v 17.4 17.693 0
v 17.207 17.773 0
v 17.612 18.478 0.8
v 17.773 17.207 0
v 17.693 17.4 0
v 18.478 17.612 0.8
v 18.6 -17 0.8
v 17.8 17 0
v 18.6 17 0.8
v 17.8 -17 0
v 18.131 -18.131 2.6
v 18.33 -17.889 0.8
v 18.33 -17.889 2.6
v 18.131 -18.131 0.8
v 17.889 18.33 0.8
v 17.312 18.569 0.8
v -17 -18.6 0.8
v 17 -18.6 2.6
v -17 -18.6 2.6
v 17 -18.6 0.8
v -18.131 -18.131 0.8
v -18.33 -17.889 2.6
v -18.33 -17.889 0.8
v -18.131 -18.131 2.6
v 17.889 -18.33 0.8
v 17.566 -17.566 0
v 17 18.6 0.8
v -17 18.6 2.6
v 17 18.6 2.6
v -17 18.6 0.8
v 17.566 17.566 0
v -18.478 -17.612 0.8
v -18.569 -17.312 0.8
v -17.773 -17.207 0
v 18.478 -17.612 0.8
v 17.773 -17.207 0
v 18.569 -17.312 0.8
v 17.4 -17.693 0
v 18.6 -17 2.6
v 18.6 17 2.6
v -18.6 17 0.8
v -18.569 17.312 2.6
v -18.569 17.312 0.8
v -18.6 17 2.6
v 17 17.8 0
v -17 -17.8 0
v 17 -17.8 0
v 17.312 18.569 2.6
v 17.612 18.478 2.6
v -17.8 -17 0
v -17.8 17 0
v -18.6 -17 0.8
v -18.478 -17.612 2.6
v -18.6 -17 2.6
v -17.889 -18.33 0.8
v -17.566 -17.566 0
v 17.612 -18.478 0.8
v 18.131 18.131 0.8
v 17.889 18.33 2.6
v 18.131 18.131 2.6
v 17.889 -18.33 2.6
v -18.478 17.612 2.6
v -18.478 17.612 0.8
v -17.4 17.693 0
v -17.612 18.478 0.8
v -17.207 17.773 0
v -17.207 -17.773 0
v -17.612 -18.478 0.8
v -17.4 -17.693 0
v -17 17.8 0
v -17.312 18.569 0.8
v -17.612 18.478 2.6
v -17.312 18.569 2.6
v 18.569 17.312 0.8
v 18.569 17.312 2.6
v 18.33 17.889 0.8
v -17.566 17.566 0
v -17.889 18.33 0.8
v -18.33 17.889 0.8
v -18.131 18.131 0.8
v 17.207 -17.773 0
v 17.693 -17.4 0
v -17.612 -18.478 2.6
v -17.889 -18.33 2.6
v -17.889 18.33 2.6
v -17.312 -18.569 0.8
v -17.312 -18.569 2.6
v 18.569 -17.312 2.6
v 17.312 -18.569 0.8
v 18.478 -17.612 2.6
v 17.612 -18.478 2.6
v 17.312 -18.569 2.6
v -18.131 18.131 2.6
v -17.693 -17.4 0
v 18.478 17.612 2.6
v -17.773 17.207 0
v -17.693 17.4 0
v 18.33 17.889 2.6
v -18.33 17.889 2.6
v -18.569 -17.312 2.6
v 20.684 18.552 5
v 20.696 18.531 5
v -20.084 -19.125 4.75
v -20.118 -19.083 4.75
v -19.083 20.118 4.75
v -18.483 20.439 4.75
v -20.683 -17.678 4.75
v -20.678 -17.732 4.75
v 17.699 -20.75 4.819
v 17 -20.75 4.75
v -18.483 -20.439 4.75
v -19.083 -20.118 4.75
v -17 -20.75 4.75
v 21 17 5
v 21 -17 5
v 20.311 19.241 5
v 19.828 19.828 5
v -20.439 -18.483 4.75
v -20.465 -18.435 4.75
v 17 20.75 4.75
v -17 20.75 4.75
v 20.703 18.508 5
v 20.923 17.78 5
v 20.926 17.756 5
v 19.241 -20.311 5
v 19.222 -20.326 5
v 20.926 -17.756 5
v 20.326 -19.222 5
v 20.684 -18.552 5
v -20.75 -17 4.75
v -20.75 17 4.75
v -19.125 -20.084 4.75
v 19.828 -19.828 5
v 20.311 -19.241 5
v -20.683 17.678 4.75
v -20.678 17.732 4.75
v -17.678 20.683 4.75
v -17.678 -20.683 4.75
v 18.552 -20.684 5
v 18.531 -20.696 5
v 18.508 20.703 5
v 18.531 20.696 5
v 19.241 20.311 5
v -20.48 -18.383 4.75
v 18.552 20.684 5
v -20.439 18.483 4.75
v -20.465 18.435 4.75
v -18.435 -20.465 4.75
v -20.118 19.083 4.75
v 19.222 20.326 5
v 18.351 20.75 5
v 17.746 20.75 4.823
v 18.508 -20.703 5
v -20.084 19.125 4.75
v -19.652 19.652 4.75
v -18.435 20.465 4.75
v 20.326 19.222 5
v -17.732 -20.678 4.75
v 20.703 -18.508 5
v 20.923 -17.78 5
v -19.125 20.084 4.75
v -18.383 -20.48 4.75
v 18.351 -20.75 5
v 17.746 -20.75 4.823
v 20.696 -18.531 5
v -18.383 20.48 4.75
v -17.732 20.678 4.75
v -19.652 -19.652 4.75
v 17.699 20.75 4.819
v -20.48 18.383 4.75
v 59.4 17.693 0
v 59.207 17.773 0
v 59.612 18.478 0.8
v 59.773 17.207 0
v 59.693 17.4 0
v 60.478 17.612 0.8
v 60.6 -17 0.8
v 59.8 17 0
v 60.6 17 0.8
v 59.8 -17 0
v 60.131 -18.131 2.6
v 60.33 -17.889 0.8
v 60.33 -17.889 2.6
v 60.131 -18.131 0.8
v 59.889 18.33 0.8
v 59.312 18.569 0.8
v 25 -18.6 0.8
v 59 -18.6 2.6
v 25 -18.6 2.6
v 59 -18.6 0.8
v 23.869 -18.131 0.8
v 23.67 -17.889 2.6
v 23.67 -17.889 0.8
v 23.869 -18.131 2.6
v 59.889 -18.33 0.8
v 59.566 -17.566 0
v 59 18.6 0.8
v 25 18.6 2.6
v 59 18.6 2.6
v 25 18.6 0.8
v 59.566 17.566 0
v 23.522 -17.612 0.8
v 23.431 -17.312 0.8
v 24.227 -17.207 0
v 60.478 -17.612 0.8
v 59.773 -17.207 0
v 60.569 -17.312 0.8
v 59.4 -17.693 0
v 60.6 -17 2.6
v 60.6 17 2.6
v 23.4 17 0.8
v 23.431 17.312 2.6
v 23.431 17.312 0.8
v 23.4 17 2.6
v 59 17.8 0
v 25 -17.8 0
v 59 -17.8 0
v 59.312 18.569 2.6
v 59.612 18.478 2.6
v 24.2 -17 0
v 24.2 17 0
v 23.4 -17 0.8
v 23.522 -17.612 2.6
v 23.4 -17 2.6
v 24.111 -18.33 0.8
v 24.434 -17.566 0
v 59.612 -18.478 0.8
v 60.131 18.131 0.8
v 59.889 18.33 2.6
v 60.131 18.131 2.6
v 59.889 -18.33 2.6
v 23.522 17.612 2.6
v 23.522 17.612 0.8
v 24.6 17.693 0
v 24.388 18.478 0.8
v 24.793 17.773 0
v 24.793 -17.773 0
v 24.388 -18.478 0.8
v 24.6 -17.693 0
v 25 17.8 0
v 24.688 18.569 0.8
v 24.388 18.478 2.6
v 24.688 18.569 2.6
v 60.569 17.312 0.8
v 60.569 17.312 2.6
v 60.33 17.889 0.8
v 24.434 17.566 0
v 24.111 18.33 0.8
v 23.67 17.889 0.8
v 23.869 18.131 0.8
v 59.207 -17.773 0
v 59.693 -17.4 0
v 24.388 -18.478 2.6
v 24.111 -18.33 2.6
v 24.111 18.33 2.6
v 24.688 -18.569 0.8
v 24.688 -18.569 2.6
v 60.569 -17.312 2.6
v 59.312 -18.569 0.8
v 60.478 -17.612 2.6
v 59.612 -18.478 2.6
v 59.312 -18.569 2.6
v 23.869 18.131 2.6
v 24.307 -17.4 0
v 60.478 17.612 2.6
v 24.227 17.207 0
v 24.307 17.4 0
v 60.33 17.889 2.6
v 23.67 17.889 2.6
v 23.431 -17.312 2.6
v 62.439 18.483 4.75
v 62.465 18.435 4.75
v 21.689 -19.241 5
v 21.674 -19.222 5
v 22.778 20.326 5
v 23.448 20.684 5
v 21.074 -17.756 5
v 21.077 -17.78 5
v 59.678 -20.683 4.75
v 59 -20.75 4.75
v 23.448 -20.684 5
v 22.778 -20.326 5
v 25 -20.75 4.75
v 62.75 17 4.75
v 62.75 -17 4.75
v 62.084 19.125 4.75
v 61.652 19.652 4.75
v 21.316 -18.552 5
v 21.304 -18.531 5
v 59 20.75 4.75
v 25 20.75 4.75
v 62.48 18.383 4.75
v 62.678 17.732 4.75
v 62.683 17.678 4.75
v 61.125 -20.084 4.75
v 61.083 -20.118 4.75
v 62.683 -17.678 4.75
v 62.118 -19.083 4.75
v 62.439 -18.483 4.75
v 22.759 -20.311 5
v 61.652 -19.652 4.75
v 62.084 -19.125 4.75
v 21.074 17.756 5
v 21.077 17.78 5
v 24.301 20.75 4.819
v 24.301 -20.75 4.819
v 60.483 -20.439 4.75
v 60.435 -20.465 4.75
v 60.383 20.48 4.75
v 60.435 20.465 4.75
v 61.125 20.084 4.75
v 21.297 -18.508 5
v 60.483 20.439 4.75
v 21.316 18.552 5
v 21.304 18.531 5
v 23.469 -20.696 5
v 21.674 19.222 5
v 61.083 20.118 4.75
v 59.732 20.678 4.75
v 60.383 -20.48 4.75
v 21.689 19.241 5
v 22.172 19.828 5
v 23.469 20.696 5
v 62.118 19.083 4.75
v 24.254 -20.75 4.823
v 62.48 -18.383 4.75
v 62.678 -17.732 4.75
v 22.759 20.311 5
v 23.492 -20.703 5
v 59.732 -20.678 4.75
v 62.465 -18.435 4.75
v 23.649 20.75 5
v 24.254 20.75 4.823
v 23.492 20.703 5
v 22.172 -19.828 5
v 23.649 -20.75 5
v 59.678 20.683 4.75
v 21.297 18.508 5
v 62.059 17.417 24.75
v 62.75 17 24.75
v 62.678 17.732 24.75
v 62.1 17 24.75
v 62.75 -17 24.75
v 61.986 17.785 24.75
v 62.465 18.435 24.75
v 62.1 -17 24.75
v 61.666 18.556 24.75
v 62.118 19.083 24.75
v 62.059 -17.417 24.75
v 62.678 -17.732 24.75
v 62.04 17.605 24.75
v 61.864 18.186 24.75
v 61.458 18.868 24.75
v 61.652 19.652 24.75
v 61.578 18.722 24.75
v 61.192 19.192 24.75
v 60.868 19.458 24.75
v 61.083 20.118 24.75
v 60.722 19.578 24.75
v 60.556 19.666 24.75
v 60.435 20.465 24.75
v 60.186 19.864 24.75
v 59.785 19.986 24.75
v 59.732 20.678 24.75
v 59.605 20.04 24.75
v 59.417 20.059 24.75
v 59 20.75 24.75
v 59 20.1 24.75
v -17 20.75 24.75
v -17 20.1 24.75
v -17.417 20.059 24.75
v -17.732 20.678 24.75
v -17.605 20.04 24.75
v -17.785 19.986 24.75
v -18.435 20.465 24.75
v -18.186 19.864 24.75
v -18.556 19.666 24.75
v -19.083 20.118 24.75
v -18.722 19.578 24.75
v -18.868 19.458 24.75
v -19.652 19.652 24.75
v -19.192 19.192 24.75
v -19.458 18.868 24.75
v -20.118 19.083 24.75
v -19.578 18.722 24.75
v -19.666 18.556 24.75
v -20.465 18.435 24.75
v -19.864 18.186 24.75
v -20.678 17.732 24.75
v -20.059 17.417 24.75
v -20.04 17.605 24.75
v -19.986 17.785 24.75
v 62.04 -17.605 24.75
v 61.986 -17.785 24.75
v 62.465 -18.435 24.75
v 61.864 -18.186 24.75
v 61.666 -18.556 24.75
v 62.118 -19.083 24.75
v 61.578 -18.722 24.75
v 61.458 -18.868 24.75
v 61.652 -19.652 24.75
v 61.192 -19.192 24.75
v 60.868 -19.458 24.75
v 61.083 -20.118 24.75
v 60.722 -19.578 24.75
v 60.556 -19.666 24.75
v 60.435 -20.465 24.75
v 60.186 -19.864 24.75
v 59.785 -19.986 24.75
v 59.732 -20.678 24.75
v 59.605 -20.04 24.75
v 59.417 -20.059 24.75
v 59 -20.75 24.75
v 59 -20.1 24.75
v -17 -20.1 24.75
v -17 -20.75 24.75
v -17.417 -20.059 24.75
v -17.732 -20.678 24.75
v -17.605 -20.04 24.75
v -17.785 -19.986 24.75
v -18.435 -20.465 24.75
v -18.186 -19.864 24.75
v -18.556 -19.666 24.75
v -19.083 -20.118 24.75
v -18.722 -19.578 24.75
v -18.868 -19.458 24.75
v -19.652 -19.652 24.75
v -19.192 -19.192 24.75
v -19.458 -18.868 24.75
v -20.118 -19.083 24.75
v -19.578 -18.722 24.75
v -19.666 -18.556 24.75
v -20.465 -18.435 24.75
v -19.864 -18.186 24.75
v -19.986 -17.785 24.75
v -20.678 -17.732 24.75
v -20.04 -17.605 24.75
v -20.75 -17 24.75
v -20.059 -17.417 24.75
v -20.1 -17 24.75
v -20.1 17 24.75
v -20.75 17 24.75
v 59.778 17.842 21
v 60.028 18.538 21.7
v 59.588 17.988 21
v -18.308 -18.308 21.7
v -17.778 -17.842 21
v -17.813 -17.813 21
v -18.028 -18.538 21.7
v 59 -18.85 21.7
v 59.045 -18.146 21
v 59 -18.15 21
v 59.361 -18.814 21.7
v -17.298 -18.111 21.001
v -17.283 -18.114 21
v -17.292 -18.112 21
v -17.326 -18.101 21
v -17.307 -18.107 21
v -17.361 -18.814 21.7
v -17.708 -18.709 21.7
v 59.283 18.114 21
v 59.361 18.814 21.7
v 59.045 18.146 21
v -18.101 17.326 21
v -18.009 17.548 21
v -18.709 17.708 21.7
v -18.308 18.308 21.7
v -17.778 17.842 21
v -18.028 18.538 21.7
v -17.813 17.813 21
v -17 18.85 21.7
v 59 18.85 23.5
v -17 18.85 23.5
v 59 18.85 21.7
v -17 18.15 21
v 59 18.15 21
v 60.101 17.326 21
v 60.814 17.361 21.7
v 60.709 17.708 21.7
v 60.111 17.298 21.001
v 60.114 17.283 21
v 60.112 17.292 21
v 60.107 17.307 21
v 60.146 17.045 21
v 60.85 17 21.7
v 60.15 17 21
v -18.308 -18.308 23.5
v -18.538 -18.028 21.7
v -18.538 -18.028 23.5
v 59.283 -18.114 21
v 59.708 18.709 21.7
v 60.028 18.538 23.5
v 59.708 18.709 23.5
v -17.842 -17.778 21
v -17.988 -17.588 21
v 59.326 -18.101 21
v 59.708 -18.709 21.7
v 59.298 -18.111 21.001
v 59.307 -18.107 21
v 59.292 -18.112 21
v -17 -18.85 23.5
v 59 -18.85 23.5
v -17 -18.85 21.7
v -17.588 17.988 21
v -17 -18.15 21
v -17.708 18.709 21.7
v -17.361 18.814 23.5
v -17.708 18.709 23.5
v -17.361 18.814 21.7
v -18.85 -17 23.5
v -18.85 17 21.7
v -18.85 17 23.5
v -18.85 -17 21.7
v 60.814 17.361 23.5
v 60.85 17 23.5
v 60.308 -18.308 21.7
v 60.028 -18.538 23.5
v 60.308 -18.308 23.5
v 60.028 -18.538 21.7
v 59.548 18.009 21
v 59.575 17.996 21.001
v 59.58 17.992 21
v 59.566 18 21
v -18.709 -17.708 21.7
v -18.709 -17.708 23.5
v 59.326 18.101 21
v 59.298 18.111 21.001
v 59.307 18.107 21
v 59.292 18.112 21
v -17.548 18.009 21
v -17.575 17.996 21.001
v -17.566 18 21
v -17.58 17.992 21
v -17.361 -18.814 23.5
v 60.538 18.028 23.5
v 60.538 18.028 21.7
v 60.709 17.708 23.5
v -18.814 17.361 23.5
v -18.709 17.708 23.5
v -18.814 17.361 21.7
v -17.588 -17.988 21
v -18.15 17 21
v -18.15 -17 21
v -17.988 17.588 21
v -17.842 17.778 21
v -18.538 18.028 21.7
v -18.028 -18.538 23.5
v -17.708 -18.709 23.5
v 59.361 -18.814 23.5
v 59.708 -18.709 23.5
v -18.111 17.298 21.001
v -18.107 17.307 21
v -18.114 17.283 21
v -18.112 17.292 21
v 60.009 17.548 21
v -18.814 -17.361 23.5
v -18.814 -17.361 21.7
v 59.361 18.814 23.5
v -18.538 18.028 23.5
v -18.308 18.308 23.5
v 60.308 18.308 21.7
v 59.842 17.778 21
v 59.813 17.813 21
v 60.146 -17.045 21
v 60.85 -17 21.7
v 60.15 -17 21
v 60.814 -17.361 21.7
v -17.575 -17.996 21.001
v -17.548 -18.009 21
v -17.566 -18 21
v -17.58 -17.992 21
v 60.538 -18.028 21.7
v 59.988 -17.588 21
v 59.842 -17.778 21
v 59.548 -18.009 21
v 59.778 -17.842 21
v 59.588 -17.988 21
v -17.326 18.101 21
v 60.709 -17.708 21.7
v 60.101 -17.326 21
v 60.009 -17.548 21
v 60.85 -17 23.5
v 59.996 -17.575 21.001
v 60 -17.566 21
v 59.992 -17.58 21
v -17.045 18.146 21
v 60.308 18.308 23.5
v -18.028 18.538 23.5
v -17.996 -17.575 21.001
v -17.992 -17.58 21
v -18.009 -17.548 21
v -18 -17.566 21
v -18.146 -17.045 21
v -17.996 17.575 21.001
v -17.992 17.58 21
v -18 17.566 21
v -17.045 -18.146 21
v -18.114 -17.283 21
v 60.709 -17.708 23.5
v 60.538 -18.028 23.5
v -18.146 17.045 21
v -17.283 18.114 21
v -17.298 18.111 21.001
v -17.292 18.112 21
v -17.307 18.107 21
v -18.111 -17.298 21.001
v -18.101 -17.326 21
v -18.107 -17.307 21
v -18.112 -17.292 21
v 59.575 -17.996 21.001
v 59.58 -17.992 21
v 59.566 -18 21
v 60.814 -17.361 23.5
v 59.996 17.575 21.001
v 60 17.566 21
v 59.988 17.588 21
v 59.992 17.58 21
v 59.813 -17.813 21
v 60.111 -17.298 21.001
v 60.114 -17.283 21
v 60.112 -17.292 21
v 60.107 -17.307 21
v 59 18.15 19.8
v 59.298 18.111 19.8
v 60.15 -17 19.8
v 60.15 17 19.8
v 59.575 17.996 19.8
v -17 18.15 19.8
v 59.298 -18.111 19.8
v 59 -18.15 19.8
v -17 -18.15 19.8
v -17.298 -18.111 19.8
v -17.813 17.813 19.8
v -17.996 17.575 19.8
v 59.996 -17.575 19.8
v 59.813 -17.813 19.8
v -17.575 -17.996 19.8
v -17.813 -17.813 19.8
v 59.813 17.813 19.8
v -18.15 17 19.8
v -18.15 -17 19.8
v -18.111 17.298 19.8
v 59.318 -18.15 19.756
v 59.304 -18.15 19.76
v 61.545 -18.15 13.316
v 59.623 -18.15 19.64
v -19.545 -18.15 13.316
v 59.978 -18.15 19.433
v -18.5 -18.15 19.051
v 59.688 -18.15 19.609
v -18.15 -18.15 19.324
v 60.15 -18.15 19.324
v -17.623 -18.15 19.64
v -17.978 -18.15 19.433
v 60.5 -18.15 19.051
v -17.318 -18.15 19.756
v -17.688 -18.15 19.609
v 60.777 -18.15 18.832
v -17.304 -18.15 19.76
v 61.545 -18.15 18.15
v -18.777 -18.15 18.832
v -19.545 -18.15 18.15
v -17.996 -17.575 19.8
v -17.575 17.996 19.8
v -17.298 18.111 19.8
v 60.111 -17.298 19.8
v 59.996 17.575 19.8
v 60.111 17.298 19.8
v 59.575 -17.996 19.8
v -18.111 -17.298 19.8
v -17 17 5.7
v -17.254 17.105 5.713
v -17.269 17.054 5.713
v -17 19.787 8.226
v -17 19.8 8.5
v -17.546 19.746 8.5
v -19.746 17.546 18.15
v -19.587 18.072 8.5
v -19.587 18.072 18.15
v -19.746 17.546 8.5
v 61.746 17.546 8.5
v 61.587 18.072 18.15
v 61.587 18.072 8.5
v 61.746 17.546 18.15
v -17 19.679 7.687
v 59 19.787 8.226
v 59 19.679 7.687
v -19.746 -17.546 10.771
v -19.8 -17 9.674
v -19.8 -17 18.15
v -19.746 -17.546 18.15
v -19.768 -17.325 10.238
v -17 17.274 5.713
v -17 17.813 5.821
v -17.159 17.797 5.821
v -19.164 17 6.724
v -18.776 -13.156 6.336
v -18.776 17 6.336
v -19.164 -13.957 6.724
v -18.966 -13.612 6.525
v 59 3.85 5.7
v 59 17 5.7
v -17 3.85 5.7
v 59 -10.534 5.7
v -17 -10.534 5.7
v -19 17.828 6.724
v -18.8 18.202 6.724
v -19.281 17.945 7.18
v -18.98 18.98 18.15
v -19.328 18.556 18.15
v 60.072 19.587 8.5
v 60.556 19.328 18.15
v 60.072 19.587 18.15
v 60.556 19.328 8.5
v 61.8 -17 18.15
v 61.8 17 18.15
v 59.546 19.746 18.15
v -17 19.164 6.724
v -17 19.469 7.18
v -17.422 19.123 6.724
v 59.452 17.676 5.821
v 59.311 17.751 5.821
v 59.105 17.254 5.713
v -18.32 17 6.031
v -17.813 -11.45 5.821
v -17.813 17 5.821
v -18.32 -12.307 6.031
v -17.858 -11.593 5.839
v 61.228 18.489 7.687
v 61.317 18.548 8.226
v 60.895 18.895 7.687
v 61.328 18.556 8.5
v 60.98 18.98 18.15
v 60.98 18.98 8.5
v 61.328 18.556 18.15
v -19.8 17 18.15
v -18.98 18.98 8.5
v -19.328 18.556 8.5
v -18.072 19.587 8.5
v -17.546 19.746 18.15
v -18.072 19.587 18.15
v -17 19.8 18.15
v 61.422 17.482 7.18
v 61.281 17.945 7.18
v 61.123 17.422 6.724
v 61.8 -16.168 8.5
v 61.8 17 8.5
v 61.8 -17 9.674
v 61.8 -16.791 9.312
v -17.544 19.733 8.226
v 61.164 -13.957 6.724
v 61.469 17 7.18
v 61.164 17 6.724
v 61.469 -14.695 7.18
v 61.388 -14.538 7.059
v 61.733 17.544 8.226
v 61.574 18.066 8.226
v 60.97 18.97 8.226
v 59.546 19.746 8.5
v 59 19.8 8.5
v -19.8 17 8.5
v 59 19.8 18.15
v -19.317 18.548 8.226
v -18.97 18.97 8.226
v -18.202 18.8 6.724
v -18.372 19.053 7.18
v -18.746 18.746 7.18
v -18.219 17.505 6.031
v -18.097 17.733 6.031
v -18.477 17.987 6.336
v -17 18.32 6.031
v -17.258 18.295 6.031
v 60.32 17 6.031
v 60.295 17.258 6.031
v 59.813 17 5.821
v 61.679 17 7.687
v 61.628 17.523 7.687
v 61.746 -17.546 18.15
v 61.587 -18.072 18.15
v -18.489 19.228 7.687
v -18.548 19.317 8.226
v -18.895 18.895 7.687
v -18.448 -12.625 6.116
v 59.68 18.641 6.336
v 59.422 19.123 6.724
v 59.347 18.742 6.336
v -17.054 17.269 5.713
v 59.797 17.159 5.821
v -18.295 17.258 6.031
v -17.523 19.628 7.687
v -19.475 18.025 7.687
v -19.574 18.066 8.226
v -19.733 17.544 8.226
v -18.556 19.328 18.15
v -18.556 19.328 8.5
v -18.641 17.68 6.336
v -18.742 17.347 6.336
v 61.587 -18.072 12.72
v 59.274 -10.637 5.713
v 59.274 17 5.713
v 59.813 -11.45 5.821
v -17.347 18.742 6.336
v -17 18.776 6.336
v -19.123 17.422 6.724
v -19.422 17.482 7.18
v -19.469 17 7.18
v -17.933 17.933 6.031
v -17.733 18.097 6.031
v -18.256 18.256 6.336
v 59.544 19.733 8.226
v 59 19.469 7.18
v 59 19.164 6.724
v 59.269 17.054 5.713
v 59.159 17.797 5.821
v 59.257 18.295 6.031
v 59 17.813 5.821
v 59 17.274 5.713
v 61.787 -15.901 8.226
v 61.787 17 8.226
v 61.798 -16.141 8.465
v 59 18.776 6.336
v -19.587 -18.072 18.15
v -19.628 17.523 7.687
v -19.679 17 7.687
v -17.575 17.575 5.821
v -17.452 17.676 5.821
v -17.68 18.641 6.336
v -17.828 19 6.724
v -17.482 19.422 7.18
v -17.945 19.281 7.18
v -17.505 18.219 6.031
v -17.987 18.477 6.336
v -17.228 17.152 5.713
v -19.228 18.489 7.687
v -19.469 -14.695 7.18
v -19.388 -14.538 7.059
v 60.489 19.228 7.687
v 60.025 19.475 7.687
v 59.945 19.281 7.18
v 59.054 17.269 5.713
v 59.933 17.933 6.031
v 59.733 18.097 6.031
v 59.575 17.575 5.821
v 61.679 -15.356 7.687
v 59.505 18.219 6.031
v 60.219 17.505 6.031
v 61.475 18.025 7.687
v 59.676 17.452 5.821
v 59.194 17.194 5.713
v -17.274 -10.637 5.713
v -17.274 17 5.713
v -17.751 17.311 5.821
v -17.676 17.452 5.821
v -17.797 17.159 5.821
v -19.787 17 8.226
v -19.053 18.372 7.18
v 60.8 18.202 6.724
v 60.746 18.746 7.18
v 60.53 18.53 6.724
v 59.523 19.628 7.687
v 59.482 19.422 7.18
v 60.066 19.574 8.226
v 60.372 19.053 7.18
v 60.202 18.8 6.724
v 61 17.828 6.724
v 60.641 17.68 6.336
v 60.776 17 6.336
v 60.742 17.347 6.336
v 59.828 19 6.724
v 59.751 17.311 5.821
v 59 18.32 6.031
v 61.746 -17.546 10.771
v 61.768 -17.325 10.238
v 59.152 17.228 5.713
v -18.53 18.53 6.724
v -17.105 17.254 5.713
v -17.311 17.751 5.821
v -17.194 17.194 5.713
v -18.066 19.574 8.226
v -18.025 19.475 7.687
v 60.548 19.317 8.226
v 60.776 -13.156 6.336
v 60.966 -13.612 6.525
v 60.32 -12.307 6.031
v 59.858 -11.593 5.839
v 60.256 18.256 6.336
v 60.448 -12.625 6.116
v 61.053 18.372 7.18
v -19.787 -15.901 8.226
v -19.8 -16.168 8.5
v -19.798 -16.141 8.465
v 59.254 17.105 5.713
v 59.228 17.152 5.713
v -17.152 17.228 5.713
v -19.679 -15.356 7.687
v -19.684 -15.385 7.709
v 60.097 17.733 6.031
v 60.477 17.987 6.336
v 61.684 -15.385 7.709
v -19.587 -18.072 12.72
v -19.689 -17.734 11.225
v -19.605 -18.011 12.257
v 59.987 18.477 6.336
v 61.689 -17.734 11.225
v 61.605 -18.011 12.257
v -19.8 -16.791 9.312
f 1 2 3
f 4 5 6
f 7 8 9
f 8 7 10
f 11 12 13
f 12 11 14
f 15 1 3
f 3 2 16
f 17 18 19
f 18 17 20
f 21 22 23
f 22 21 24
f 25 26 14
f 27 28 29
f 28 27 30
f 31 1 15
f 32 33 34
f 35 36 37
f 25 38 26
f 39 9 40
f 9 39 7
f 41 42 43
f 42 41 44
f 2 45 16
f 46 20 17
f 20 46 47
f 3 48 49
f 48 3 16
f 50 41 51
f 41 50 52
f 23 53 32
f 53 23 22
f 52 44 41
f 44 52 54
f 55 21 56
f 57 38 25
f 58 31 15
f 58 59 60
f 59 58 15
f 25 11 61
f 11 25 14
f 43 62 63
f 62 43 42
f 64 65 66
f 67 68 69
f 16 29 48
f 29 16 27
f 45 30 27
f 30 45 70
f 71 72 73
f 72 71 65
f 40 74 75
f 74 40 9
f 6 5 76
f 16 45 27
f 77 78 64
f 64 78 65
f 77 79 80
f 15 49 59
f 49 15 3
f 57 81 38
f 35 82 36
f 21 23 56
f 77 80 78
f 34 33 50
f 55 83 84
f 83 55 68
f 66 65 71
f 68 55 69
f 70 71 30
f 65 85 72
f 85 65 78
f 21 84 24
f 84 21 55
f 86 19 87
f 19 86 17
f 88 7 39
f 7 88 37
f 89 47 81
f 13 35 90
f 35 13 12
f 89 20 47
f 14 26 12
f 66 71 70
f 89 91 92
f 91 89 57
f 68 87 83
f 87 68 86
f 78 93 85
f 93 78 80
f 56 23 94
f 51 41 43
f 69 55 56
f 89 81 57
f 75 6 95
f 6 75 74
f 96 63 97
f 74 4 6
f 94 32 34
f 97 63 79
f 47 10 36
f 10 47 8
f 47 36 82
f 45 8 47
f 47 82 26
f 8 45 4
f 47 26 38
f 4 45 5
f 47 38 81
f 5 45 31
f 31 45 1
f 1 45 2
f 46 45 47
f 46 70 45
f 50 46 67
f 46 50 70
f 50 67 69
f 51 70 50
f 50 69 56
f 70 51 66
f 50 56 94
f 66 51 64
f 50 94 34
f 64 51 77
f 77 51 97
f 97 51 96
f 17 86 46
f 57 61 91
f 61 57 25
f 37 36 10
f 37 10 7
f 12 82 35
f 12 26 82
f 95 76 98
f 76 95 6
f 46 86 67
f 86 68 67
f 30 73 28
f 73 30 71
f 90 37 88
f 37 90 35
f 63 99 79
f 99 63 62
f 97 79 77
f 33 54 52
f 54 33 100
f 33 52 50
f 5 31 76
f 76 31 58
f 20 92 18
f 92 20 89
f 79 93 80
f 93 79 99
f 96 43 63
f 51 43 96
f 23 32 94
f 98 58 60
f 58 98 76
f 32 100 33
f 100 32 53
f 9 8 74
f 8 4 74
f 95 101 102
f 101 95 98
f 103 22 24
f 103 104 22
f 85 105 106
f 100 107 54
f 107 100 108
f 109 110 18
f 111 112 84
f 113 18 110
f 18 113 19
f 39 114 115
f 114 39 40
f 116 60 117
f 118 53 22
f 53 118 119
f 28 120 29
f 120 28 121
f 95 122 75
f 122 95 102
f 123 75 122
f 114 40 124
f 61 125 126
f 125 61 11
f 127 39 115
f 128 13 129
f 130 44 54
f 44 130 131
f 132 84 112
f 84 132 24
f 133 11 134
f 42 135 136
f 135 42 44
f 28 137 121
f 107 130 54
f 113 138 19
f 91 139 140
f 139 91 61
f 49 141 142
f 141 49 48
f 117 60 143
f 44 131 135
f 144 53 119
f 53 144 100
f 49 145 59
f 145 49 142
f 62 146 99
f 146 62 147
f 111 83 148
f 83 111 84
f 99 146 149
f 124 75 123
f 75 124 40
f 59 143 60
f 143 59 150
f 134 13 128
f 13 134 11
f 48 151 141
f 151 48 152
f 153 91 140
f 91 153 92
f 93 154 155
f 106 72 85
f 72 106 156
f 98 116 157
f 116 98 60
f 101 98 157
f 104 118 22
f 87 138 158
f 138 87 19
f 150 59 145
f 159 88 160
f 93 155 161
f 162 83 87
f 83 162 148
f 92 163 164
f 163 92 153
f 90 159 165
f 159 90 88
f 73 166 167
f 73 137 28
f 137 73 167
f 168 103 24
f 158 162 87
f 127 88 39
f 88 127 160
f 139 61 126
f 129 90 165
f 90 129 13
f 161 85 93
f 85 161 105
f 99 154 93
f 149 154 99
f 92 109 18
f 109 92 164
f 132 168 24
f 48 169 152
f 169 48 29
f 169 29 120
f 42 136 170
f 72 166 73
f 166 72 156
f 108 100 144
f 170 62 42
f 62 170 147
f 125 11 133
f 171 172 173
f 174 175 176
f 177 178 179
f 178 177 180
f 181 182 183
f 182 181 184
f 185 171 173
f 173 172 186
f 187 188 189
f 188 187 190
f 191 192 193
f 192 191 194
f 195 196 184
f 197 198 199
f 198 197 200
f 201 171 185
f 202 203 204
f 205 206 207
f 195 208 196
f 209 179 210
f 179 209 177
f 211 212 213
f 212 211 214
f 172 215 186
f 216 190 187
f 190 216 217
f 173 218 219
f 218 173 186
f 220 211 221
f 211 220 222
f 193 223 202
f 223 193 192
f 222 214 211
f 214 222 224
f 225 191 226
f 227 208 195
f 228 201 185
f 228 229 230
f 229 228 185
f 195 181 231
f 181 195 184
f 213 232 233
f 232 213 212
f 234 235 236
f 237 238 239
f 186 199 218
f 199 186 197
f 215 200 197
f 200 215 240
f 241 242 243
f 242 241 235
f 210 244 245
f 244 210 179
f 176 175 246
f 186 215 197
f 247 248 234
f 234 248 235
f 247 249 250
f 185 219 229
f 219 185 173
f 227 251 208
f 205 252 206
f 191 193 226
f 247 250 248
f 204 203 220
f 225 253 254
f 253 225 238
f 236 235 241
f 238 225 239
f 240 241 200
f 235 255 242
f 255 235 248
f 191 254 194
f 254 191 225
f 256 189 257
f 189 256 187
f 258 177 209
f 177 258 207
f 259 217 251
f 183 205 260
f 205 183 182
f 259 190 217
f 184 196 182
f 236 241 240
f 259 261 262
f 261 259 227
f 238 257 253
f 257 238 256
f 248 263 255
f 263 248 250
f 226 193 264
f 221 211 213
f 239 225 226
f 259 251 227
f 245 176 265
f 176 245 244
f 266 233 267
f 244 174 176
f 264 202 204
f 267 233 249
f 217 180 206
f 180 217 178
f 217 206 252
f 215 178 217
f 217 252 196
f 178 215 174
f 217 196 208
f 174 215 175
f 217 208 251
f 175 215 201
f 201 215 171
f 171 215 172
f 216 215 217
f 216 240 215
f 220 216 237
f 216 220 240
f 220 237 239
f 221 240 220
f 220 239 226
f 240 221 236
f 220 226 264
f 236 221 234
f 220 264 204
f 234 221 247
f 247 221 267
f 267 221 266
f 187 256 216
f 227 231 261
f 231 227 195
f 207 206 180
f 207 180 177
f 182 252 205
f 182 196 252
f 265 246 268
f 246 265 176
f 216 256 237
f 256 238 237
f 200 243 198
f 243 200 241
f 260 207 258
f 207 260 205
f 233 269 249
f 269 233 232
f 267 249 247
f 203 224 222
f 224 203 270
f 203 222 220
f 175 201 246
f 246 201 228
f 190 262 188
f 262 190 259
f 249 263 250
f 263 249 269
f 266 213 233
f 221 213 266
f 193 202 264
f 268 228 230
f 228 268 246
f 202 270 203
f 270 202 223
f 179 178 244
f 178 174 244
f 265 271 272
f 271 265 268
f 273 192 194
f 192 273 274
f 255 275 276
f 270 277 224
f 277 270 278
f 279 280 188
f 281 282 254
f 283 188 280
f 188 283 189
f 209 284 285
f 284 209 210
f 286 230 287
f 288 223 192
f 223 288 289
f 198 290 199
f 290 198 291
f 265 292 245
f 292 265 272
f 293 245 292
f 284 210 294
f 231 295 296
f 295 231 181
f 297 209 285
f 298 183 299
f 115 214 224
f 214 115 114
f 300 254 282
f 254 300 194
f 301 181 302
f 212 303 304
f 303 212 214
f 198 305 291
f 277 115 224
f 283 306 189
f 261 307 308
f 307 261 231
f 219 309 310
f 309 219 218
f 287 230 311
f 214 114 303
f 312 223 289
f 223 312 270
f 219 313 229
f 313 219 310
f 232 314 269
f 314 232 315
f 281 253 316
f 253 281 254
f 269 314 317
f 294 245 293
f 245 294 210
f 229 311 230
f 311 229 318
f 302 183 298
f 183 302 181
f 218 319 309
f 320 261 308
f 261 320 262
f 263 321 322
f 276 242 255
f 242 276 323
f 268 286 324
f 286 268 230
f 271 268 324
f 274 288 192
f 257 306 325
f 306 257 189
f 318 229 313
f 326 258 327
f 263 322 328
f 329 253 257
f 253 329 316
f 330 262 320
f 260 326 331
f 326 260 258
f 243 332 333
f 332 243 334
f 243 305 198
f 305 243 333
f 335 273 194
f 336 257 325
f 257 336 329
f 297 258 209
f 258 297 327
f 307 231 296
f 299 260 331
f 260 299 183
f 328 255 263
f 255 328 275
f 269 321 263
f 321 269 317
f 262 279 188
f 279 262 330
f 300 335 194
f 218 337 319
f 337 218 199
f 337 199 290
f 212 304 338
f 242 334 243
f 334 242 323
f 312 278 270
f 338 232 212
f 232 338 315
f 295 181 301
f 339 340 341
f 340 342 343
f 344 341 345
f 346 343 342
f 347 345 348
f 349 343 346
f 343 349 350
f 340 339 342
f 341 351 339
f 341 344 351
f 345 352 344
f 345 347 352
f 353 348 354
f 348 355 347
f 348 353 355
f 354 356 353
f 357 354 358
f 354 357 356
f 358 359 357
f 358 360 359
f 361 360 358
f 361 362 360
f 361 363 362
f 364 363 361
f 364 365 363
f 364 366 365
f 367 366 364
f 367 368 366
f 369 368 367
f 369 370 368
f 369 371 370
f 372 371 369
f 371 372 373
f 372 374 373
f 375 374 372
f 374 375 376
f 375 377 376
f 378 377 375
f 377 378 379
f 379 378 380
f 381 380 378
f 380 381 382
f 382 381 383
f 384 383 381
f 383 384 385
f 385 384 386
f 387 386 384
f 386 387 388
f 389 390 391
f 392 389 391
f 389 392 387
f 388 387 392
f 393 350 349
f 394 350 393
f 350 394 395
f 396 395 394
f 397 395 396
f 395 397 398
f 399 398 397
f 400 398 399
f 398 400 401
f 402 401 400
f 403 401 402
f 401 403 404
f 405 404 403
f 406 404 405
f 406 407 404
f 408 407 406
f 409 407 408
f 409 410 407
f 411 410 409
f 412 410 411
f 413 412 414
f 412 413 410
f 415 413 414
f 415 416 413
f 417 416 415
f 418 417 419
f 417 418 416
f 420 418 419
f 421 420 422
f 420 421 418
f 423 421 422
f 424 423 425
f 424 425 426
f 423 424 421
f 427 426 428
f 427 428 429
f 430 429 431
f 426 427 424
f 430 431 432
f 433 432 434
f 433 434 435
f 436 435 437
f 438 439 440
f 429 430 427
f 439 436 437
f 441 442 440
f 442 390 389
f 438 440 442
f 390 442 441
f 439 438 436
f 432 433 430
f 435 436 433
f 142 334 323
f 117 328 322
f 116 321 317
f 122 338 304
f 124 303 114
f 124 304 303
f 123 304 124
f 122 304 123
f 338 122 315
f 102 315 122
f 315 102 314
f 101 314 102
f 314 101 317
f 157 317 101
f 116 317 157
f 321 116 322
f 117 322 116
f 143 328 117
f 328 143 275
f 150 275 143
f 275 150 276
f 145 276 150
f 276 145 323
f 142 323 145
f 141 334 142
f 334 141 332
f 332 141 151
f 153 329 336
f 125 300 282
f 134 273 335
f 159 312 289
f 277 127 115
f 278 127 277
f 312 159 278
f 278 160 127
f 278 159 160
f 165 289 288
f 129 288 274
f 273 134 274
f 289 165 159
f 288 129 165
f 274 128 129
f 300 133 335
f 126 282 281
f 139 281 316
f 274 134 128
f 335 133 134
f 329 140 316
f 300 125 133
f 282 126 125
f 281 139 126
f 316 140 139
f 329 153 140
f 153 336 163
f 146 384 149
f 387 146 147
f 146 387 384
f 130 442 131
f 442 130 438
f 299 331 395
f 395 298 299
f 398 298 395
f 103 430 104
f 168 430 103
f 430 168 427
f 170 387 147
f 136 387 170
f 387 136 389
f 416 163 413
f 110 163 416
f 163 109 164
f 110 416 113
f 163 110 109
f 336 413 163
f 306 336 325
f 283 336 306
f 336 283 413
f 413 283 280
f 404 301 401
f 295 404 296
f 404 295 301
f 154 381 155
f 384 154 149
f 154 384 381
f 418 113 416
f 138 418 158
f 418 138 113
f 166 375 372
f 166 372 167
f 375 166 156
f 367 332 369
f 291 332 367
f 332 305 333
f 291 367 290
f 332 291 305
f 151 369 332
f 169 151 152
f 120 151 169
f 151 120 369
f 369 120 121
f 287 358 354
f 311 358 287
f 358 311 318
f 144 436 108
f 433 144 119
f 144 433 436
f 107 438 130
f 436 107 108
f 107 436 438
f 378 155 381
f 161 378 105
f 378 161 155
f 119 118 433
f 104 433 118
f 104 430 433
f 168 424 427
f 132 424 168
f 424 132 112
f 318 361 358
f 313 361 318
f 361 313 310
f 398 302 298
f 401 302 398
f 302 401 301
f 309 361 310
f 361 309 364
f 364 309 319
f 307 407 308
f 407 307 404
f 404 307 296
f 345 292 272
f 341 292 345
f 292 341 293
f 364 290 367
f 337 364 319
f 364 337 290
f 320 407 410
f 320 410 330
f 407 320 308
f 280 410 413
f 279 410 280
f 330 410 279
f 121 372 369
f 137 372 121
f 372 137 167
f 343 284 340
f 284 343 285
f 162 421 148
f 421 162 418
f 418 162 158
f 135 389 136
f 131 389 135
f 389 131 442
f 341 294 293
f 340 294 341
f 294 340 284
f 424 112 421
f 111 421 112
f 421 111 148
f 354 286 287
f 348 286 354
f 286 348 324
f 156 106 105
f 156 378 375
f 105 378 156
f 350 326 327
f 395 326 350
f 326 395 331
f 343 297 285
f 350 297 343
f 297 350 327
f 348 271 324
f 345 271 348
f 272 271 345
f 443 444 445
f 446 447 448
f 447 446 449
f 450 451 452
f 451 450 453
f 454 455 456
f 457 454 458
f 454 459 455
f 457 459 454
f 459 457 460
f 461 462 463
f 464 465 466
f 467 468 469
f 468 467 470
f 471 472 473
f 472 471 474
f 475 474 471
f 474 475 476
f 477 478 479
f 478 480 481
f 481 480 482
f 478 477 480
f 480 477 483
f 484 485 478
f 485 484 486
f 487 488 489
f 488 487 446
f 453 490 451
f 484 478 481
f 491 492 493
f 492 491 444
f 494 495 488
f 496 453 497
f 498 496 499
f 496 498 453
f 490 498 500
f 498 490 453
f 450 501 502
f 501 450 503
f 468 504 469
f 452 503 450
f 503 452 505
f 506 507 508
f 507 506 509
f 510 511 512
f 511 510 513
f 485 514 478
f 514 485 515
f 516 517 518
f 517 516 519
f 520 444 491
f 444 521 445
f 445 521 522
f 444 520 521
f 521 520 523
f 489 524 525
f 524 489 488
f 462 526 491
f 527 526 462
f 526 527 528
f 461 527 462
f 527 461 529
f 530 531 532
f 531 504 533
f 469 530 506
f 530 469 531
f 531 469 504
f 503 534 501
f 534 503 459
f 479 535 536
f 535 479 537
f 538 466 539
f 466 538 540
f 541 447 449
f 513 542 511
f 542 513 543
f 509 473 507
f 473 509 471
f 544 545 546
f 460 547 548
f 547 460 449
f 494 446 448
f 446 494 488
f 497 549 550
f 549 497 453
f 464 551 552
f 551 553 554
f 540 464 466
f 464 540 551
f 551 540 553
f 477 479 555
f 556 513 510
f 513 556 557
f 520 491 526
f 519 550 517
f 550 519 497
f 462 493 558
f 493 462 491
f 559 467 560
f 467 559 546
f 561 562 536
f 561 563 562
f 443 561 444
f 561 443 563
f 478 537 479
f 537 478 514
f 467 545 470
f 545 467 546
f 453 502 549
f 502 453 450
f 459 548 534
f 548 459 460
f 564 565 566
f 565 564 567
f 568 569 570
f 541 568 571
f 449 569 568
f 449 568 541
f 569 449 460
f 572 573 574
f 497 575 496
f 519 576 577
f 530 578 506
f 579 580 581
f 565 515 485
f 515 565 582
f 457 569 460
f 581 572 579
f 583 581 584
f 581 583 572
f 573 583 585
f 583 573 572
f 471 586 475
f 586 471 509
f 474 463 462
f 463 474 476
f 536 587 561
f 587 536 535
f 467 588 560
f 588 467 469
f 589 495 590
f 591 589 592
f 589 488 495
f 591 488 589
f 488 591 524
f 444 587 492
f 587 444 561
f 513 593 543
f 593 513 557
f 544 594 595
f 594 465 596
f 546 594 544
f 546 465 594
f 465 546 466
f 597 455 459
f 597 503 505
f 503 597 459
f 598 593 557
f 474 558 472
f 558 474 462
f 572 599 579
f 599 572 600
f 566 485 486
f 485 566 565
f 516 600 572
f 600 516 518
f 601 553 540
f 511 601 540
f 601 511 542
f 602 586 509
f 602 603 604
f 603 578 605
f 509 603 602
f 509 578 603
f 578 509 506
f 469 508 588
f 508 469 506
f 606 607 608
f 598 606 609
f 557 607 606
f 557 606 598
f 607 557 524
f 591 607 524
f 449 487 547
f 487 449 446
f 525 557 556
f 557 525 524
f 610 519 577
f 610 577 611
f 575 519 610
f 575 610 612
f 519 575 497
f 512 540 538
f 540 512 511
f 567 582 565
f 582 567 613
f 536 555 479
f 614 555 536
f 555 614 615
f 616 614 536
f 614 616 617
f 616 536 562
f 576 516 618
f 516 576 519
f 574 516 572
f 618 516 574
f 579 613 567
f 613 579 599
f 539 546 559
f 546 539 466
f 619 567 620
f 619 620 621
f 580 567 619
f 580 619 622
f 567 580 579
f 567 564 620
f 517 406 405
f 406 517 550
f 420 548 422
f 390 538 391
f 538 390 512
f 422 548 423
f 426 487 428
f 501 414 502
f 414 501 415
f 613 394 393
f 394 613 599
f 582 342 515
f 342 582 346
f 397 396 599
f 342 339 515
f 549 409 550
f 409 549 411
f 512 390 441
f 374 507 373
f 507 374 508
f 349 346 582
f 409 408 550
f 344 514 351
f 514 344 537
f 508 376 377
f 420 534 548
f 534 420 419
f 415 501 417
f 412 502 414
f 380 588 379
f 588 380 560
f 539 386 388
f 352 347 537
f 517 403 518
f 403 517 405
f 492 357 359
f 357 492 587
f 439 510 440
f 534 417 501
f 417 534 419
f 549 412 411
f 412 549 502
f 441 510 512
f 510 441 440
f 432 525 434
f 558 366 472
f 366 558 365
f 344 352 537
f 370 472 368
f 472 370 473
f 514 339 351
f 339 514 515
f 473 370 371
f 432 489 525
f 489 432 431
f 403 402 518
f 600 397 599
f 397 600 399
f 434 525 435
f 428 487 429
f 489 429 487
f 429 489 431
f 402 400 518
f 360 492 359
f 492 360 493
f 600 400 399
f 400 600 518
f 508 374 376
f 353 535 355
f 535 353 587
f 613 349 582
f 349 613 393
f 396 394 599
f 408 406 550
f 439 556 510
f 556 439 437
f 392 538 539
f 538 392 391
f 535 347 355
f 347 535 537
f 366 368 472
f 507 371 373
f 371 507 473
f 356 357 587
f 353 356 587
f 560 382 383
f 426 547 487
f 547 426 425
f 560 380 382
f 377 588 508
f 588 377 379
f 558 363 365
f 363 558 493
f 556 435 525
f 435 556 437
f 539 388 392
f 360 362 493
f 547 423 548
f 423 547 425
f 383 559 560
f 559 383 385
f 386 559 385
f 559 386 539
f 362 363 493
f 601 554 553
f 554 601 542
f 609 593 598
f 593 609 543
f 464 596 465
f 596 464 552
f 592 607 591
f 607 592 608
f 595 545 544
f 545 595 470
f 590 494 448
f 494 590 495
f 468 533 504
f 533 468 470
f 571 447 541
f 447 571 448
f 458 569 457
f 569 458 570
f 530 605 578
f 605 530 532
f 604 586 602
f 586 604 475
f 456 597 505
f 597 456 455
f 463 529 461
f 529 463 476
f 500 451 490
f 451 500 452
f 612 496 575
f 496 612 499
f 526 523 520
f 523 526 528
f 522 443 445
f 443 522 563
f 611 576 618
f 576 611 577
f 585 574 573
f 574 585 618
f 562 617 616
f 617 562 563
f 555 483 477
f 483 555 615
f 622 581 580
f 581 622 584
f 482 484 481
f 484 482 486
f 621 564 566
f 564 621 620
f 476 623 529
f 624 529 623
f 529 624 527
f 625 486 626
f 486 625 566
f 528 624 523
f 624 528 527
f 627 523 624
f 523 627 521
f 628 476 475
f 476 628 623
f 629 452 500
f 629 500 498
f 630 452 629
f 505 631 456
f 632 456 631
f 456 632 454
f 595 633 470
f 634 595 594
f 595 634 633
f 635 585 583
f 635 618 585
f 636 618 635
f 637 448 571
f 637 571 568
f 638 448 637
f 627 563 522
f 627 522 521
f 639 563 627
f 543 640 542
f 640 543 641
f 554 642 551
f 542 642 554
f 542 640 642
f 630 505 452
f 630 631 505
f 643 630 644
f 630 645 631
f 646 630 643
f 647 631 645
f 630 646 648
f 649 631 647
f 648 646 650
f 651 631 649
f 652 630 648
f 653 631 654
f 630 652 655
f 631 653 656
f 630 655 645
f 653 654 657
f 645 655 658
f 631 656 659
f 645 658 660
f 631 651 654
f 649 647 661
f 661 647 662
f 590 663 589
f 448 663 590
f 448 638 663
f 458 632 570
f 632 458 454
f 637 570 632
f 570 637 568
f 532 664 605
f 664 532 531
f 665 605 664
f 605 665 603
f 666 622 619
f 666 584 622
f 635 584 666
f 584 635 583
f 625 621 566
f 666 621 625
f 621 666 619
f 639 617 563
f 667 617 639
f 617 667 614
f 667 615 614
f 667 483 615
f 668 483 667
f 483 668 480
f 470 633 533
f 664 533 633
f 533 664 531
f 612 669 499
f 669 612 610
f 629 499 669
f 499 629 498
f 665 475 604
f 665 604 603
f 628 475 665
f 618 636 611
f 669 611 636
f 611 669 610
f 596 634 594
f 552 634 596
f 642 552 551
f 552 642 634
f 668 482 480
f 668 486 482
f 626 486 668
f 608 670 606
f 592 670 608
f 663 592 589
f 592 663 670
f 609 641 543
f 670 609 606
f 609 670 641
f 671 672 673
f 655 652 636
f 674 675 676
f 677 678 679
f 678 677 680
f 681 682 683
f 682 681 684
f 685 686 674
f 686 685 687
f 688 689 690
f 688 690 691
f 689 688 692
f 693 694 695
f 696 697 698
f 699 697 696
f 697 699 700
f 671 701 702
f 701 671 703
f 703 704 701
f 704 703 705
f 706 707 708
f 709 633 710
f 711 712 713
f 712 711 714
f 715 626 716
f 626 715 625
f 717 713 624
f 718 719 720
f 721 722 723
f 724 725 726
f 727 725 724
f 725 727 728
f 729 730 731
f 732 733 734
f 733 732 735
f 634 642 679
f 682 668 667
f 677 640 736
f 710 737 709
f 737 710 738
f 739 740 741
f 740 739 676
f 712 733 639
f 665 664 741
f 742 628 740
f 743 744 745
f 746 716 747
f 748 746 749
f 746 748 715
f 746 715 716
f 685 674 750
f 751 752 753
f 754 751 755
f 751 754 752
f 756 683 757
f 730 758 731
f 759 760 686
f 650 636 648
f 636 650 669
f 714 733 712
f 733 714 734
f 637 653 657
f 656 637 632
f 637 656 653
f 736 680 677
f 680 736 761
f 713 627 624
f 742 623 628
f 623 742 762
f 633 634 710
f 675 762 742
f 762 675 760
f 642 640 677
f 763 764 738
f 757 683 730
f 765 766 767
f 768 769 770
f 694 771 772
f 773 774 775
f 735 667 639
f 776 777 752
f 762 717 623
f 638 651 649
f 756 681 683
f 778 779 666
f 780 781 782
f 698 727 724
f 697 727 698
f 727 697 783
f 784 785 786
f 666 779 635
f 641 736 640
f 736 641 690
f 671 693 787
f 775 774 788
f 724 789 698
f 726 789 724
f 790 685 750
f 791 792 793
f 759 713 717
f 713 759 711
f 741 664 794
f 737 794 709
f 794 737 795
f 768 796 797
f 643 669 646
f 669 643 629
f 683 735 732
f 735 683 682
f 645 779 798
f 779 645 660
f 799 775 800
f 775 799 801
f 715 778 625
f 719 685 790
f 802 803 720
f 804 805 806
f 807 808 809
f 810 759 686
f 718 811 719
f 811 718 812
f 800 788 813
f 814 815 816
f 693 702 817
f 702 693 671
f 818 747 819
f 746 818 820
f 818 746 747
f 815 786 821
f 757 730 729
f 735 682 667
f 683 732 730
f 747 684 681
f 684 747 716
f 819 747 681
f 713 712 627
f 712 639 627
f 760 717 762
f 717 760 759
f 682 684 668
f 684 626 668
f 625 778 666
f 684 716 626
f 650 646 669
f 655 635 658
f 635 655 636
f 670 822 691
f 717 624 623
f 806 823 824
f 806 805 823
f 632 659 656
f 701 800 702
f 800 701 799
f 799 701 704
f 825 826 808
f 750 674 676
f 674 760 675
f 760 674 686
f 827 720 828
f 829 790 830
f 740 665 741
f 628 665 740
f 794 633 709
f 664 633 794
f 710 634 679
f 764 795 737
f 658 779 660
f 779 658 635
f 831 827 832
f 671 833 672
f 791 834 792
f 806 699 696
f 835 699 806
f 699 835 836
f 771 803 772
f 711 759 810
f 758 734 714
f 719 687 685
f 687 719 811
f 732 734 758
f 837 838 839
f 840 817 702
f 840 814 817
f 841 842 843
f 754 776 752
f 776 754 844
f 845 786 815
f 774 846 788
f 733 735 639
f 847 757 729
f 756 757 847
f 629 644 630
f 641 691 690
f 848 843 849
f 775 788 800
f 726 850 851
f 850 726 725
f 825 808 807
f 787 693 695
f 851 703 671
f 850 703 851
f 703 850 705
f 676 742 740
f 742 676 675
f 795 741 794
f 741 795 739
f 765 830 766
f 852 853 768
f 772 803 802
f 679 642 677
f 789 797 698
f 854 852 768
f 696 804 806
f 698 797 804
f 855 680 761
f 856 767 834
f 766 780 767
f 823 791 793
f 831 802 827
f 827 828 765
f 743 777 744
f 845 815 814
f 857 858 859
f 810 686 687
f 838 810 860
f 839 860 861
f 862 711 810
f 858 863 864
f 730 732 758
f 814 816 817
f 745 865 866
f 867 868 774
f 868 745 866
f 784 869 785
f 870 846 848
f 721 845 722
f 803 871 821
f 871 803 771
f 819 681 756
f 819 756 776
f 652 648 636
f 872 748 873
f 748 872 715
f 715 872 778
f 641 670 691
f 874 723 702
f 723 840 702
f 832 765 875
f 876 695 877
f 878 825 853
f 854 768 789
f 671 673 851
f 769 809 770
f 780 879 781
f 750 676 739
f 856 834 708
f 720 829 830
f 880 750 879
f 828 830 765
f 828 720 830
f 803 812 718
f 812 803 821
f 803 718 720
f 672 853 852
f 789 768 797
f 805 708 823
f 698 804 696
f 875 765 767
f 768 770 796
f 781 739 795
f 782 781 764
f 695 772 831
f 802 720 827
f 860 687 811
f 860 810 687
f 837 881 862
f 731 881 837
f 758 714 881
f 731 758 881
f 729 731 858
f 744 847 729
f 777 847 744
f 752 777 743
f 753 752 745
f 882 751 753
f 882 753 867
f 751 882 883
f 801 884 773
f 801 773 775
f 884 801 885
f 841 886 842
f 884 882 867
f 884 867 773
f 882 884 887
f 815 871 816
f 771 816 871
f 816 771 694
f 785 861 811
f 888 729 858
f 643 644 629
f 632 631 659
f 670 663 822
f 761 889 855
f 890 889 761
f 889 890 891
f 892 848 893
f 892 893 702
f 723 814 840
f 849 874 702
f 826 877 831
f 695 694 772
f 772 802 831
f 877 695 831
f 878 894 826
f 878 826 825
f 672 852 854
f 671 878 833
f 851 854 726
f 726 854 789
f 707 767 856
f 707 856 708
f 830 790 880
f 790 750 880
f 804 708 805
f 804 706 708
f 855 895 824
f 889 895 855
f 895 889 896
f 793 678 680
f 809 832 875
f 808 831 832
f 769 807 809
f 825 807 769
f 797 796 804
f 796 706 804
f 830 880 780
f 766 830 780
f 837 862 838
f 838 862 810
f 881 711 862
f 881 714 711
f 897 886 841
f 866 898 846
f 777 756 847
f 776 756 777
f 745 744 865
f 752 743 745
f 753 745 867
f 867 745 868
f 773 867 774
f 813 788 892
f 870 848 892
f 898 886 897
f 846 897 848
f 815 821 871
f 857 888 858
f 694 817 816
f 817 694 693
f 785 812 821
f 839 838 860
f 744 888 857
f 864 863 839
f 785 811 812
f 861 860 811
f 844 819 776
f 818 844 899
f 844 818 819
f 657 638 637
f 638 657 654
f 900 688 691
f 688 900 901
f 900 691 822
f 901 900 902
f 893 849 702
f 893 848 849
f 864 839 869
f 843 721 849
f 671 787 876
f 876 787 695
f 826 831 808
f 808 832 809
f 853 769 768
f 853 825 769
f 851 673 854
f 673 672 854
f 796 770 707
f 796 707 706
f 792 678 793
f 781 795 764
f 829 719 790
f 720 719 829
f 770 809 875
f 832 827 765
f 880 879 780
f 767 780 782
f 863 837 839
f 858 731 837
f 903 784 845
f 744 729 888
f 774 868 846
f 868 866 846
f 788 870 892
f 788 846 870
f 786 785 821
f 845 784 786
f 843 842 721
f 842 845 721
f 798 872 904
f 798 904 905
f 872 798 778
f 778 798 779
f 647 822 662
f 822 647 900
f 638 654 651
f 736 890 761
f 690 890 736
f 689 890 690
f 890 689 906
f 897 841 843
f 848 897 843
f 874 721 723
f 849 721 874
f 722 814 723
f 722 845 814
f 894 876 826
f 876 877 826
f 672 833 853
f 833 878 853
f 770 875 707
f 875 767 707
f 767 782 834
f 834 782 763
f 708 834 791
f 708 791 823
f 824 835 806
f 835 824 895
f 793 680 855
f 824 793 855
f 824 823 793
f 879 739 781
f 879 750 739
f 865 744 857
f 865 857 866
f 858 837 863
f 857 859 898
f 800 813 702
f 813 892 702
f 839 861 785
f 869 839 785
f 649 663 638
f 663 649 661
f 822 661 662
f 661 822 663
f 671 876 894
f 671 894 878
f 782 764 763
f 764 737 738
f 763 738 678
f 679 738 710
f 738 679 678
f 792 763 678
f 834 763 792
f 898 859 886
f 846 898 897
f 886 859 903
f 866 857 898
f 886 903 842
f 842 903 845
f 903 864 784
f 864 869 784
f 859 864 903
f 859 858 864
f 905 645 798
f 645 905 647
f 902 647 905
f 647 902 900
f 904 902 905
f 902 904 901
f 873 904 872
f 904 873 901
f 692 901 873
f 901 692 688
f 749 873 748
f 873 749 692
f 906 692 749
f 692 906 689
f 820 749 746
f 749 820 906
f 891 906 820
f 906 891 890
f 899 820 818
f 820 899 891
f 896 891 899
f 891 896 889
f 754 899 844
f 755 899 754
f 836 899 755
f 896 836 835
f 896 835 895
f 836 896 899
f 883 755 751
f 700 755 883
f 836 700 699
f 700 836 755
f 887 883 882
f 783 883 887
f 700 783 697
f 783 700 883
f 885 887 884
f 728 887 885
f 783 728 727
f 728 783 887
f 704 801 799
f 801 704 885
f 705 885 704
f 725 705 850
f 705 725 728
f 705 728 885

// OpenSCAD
// file: gridfinity_modules.scad
gridfinity_pitch = 42;
gridfinity_zpitch = 7;
gridfinity_clearance = 0.5;  // each bin is undersize by this much

// basic block with cutout in top to be stackable, optional holes in bottom
// start with this and begin 'carving'
module grid_block(num_x=1, num_y=1, num_z=2, magnet_diameter=6.5, screw_depth=6, center=false, hole_overhang_remedy=false, half_pitch=false) {
  corner_radius = 3.75;
  outer_size = gridfinity_pitch - gridfinity_clearance;  // typically 41.5
  block_corner_position = outer_size/2 - corner_radius;  // need not match center of pad corners
  magnet_thickness = 2.4;
  magnet_position = min(gridfinity_pitch/2-8, gridfinity_pitch/2-4-magnet_diameter/2);
  screw_hole_diam = 3;
  gp = gridfinity_pitch;
  
  suppress_holes = num_x < 1 || num_y < 1;
  
  emd = suppress_holes ? 0 : magnet_diameter; // effective magnet diameter after override
  esd = suppress_holes ? 0 : screw_depth;     // effective screw depth after override
  
  overhang_fix = hole_overhang_remedy && emd > 0 && esd > 0;
  overhang_fix_depth = 0.3;  // assume this is enough
  
  totalht=gridfinity_zpitch*num_z+3.75;
  translate( center ? [-(num_x-1)*gridfinity_pitch/2, -(num_y-1)*gridfinity_pitch/2, 0] : [0, 0, 0] )
  difference() {
    intersection() {
      union() {
        // logic for constructing odd-size grids of possibly half-pitch pads
        pad_grid(num_x, num_y, half_pitch);
        // main body will be cut down afterward
        translate([-gridfinity_pitch/2, -gridfinity_pitch/2, 5]) 
        cube([gridfinity_pitch*num_x, gridfinity_pitch*num_y, totalht-5]);
      }
      
      // crop with outer cylinders
      translate([0, 0, -0.1])
      hull() 
      cornercopy(block_corner_position, num_x, num_y) 
      cylinder(r=corner_radius, h=totalht+0.2, $fn=32);
    }
    
    // remove top so XxY can fit on top
      color("blue") 
      translate([0, 0, gridfinity_zpitch*num_z]) 
      pad_oversize(num_x, num_y, 1);
    
    if (esd > 0) {  // add pockets for screws if requested
      gridcopy(ceil(num_x), ceil(num_y)) cornercopy(magnet_position)
      translate([0, 0, -0.1]) cylinder(d=screw_hole_diam, h=esd+0.1, $fn=28);
    }
    
    if (emd > 0) {  // add pockets for magnets if requested
      gridcopy(ceil(num_x), ceil(num_y)) cornercopy(magnet_position)
      translate([0, 0, -0.1]) cylinder(d=emd, h=magnet_thickness+0.1, $fn=41);
    }
    
    if (overhang_fix) {  // people seem to really like this overhang fix
      gridcopy(ceil(num_x), ceil(num_y)) cornercopy(magnet_position)
      translate([0, 0, magnet_thickness-0.1]) 
      render() intersection() {  // for some reason OpenSCAD blows up if I don't render here
        translate([-emd/2, -screw_hole_diam/2, 0]) cube([emd, screw_hole_diam, overhang_fix_depth+0.1]);
        cylinder(d=emd, h=1, $fn=41);
      }
    }
  }
}


module pad_grid(num_x, num_y, half_pitch=false) {
  // if num_x (or num_y) is less than 1 (or less than 0.5 if half_pitch is enabled) then round over the far side
  cut_far_x = (num_x < 1 && !half_pitch) || (num_x < 0.5);
  cut_far_y = (num_y < 1 && !half_pitch) || (num_y < 0.5);
  
  if (half_pitch) {
    gridcopy(ceil(num_x), ceil(num_y)) intersection() {
      pad_halfsize();
      if (cut_far_x) {
        translate([gridfinity_pitch*(-0.5+num_x), 0, 0]) pad_halfsize();
      }
      if (cut_far_y) {
        translate([0, gridfinity_pitch*(-0.5+num_y), 0]) pad_halfsize();
      }
      if (cut_far_x && cut_far_y) {
        // without this the far corner would be rectangular
        translate([gridfinity_pitch*(-0.5+num_x), gridfinity_pitch*(-0.5+num_y), 0]) pad_halfsize();
      }
    }
  }
  else {
    gridcopy(ceil(num_x), ceil(num_y)) intersection() {
      pad_oversize();
      if (cut_far_x) {
        translate([gridfinity_pitch*(-1+num_x), 0, 0]) pad_oversize();
      }
      if (cut_far_y) {
        translate([0, gridfinity_pitch*(-1+num_y), 0]) pad_oversize();
      }
      if (cut_far_x && cut_far_y) {
        // without this the far corner would be rectangular
        translate([gridfinity_pitch*(-1+num_x), gridfinity_pitch*(-1+num_y), 0]) pad_oversize();
      }
    }
  }
}


module pad_halfsize() {
  render()  // render here to keep tree from blowing up
  for (xi=[0:1]) for (yi=[0:1]) translate([xi*gridfinity_pitch/2, yi*gridfinity_pitch/2, 0])
  intersection() {
    pad_oversize();
    translate([-gridfinity_pitch/2, 0, 0]) pad_oversize();
    translate([0, -gridfinity_pitch/2, 0]) pad_oversize();
    translate([-gridfinity_pitch/2, -gridfinity_pitch/2, 0]) pad_oversize();
  }
}


// unit pad slightly oversize at the top to be trimmed or joined with other feet or the rest of the model
// also useful as cutouts for stacking
module pad_oversize(num_x=1, num_y=1, margins=0) {
  pad_corner_position = gridfinity_pitch/2 - 4; // must be 17 to be compatible
  bevel1_top = 0.8;     // z of top of bottom-most bevel (bottom of bevel is at z=0)
  bevel2_bottom = 2.6;  // z of bottom of second bevel
  bevel2_top = 5;       // z of top of second bevel
  bonus_ht = 0.2;       // extra height (and radius) on second bevel
  
  // female parts are a bit oversize for a nicer fit
  radialgap = margins ? 0.25 : 0;  // oversize cylinders for a bit of clearance
  axialdown = margins ? 0.1 : 0;   // a tiny bit of axial clearance present in Zack's design
  
  translate([0, 0, -axialdown])
  difference() {
    union() {
      hull() cornercopy(pad_corner_position, num_x, num_y) {
        cylinder(d=1.6+2*radialgap, h=0.1, $fn=24);
        translate([0, 0, bevel1_top]) cylinder(d=3.2+2*radialgap, h=1.9, $fn=32);
      }
      
      hull() cornercopy(pad_corner_position, num_x, num_y) {
        translate([0, 0, bevel2_bottom]) 
        cylinder(d1=3.2+2*radialgap, d2=7.5+0.5+2*radialgap+2*bonus_ht, h=bevel2_top-bevel2_bottom+bonus_ht, $fn=32);
      }
    }
    
    // cut off bottom if we're going to go negative
    if (margins) {
      translate([-gridfinity_pitch/2, -gridfinity_pitch/2, 0])
      cube([gridfinity_pitch*num_x, gridfinity_pitch*num_y, axialdown]);
    }
  }
}


// similar to quadtranslate but expands to extremities of a block
module cornercopy(r, num_x=1, num_y=1) {
  for (xx=[-r, gridfinity_pitch*(num_x-1)+r]) for (yy=[-r, gridfinity_pitch*(num_y-1)+r]) 
    translate([xx, yy, 0]) children();
}


// make repeated copies of something(s) at the gridfinity spacing of 42mm
module gridcopy(num_x, num_y) {
  for (xi=[1:num_x]) for (yi=[1:num_y]) translate([gridfinity_pitch*(xi-1), gridfinity_pitch*(yi-1), 0]) children();
}
// main file
// include <gridfinity_modules.scad>
use <gridfinity_cup_modules.scad>

// X dimension in grid units
width = 2; // [ 0.5, 1, 2, 3, 4, 5, 6, 7, 8, 9, 10, 11, 12, 13 ]
// Y dimension in grid units
depth = 1; // [ 1, 2, 3, 4, 5, 6, 7, 8, 9, 10, 11, 12, 13 ]
// Z dimension (multiples of 7mm)
height = 3;// [2, 3, 4, 5, 6, 7]
// (Zack's design uses magnet diameter of 6.5)
magnet_diameter = 0;  // .1
// (Zack's design uses depth of 6)
screw_depth = 0;
// Hole overhang remedy is active only when both screws and magnets are nonzero (and this option is selected)
hole_overhang_remedy = true;
// Fill in solid block (overrides all following options)
filled_in = false;
// X dimension subdivisions
chambers = 1;
// Include overhang for labeling (and specify left/right/center justification)
withLabel = "disabled"; // ["disabled", "left", "right", "center", "leftchamber", "rightchamber", "centerchamber"]
// Include larger corner fillet
fingerslide = true;
// Width of the label in number of units, or zero means full width
labelWidth = 0;  // .01
// Minimum thickness above cutouts in base (Zack's design is effectively 1.2)
floor_thickness = 0.7;
// Wall thickness (Zack's design is 0.95)
wall_thickness = 0.95;  // .01
// Efficient floor option saves material and time, but the floor is not smooth (only applies if no magnets, screws, or finger-slide used)
efficient_floor = false;
// When enabled, irregular subdivisions have to be defined in code
irregular_subdivisions = false;
// Enable to subdivide bottom pads to allow half-cell offsets
half_pitch = false;
// Remove lower lip (stacking box supported on upper beveled edge only)
remove_lip = false;

module end_of_customizer_opts() {}

// Separator positions are defined in terms of grid units from the left end
separator_positions = [ 0.25, 0.5, 1.4 ];

if (filled_in) {
  grid_block(width, depth, height, magnet_diameter=magnet_diameter, 
    screw_depth=screw_depth, hole_overhang_remedy=hole_overhang_remedy,
    half_pitch=half_pitch);
}
else if (irregular_subdivisions) {
  irregular_cup(
    num_x=width,
    num_y=depth,
    num_z=height,
    withLabel=withLabel,
    labelWidth=labelWidth,
    fingerslide=fingerslide,
    magnet_diameter=magnet_diameter,
    screw_depth=screw_depth,
    floor_thickness=floor_thickness,
    wall_thickness=wall_thickness,
    hole_overhang_remedy=hole_overhang_remedy,
    separator_positions=separator_positions,
    half_pitch=half_pitch,
    remove_lip=remove_lip
  );
}
else {
  basic_cup(
    num_x=width,
    num_y=depth,
    num_z=height,
    chambers=chambers,
    withLabel=withLabel,
    labelWidth=labelWidth,
    fingerslide=fingerslide,
    magnet_diameter=magnet_diameter,
    screw_depth=screw_depth,
    floor_thickness=floor_thickness,
    wall_thickness=wall_thickness,
    hole_overhang_remedy=hole_overhang_remedy,
    efficient_floor=efficient_floor,
    half_pitch=half_pitch,
    remove_lip=remove_lip
  );
}
